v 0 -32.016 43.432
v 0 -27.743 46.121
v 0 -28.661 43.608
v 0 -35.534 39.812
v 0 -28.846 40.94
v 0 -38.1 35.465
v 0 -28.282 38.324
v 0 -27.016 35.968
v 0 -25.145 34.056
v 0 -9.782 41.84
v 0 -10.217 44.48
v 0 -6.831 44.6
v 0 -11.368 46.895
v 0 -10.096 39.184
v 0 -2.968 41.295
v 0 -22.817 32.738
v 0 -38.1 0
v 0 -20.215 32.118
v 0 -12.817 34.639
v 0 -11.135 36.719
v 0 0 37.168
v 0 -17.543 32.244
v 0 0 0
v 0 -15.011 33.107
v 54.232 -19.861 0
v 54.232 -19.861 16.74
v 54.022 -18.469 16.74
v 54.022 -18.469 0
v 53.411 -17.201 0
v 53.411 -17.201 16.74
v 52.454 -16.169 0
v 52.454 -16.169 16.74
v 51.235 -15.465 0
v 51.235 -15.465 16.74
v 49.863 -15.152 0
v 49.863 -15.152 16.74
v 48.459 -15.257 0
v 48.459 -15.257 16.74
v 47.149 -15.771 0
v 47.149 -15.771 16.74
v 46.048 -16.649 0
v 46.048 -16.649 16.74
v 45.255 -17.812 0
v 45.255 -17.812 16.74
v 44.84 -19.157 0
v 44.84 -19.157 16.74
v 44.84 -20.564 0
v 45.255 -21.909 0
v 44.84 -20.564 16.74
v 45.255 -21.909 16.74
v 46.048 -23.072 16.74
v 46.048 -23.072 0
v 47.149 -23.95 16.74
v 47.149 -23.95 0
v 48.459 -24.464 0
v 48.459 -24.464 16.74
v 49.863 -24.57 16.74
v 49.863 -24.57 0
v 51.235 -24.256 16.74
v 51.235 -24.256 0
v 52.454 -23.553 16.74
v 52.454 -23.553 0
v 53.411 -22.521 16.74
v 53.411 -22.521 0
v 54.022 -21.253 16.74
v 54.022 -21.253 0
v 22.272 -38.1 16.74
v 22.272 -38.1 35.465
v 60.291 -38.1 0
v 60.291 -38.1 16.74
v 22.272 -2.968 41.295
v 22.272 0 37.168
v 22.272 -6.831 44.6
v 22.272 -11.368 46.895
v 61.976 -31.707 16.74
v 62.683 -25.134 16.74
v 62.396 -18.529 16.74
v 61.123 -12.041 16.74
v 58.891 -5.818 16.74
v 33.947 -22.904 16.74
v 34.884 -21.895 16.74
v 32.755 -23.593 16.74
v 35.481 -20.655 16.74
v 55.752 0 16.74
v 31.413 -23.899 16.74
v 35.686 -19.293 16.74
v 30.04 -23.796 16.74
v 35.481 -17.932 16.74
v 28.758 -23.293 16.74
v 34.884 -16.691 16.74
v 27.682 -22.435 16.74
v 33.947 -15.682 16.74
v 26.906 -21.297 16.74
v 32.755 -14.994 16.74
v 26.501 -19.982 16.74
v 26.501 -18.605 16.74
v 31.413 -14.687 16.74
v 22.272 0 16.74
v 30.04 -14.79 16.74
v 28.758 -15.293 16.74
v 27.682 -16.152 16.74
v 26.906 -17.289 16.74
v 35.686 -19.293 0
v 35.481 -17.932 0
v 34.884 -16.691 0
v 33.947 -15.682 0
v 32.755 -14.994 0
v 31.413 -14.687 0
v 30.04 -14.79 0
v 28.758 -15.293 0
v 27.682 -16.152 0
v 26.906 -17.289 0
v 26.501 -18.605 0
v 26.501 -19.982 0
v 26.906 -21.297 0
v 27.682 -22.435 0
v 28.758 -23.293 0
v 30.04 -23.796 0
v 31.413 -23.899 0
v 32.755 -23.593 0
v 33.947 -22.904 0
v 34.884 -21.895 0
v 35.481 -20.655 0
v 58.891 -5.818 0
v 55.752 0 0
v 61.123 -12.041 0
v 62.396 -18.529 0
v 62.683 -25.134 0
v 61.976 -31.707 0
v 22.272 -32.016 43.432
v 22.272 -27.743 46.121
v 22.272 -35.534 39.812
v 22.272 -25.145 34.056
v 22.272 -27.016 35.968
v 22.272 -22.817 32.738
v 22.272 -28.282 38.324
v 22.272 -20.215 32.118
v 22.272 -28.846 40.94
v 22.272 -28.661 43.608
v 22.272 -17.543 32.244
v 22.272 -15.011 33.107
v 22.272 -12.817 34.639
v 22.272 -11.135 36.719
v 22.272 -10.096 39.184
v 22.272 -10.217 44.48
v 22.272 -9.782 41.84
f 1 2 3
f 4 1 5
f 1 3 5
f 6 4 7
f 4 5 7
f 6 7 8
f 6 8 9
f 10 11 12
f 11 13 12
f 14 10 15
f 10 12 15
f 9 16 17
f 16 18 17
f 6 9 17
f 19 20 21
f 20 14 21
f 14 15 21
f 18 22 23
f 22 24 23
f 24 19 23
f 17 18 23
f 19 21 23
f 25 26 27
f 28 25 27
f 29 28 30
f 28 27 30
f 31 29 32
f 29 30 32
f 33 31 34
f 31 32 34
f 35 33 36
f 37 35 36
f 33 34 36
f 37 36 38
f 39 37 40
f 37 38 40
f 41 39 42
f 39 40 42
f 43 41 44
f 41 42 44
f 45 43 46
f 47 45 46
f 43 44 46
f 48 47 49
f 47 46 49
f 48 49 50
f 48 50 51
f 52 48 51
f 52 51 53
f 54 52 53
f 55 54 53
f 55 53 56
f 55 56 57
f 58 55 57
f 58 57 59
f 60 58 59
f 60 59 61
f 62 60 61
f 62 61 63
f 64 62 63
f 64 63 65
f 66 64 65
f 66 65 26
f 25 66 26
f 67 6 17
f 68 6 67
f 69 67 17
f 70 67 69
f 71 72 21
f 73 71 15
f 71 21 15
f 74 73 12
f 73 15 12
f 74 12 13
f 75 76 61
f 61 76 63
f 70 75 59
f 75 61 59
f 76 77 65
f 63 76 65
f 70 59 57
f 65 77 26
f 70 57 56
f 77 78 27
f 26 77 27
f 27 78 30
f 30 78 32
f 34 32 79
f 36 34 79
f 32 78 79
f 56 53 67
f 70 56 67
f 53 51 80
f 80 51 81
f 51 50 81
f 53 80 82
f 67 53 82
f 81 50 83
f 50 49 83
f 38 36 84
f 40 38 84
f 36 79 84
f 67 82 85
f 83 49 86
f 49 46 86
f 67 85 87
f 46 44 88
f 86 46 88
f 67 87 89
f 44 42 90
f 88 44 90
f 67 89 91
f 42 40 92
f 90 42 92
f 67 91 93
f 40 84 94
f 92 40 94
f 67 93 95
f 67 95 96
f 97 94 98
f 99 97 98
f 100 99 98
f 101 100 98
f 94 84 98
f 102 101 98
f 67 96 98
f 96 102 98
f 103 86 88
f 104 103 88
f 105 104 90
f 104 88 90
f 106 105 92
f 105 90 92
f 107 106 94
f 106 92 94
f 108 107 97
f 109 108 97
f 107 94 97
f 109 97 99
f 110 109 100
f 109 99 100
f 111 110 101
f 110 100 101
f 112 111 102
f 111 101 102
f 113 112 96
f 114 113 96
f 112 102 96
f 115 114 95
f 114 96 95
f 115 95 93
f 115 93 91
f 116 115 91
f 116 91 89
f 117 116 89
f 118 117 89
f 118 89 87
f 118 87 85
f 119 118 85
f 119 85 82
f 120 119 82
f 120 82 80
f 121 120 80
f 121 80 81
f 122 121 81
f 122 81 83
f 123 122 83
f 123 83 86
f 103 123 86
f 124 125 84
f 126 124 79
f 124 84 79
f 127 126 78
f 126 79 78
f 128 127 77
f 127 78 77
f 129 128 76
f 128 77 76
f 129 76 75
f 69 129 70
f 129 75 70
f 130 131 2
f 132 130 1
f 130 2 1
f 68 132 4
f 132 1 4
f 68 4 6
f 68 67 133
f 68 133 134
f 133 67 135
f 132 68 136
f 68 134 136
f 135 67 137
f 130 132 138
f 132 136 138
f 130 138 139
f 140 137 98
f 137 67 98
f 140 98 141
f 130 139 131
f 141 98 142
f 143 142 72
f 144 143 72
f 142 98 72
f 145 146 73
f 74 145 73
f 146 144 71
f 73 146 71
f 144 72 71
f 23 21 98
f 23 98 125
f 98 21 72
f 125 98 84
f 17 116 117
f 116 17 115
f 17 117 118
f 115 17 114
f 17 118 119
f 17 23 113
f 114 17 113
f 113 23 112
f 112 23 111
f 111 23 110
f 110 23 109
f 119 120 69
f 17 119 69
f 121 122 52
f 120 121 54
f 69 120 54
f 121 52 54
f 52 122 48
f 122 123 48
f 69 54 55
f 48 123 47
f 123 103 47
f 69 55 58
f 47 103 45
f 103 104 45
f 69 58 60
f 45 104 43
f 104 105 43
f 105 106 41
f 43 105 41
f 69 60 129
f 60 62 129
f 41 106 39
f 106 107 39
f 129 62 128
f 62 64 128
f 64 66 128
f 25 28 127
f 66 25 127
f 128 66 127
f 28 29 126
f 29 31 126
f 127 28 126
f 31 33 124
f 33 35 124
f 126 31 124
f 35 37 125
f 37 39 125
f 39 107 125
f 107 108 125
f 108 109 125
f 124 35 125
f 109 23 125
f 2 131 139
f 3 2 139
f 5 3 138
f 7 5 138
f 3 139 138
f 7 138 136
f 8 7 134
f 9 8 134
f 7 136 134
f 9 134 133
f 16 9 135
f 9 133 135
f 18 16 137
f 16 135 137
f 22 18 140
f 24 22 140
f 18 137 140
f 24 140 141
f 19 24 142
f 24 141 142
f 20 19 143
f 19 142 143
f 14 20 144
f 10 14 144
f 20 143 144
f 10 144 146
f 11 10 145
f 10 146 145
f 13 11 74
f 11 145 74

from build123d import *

# Parameters (mm, degrees)
F1_DEPTH  = 38.1
F3_DEPTH  = 25.4
F4_R      = 4.6186777809
F4_R_2    = 4.7220992833
F5_DEPTH  = 25.4
F7_DEPTH  = 25.4
F9_DEPTH  = 25.4
F11_DEPTH = 25.4


with BuildPart() as f1:
    # F0 (on Front) → F1 (new body)
    with BuildSketch(Plane.XZ):
        Polygon((0, 49.3678711355), (0, 0), (68.8029304147, 0), (68.8029304147, 16.7396813631), (22.272285074, 16.7396813631), (22.272285074, 49.3678711355), align=None)
    extrude(amount=F1_DEPTH)

    # F2 (on face) → F3 (cut)
    with BuildSketch(Plane.XY.offset(16.7396813631)):
        with BuildLine():
            ThreePointArc((55.7516478002, 0), (66.4469620448, -18.046107265), (60.291223228, -38.1))
            Line((60.291223228, -38.1), (68.8029304147, -38.1))
            Line((68.8029304147, -38.1), (68.8029304147, 0))
            Line((68.8029304147, 0), (55.7516478002, 0))
        make_face()
    extrude(amount=-F3_DEPTH, mode=Mode.SUBTRACT)

    # F4 (on face) → F5 (cut)
    with BuildSketch(Plane.XY.offset(16.7396813631)):
        with Locations((31.0677159578, -19.2931909114)):
            Circle(F4_R)
        with Locations((49.5097339153, -19.8606383055)):
            Circle(F4_R_2)
    extrude(amount=-F5_DEPTH, mode=Mode.SUBTRACT)

    # F6 (on face) → F7 (cut)
    with BuildSketch(Plane(origin=(0, 0, 0), x_dir=(0, -1, 0), z_dir=(-1, 0, 0))):
        with BuildLine():
            ThreePointArc((0, 37.1677689254), (19.5787852864, 48.1513039346), (38.1, 35.465426743))
            Line((38.1, 35.465426743), (38.1, 49.3678711355))
            Line((38.1, 49.3678711355), (0, 49.3678711355))
            Line((0, 49.3678711355), (0, 37.1677689254))
        make_face()
    extrude(amount=-F7_DEPTH, mode=Mode.SUBTRACT)

    # F8 (on face) → F9 (cut)
    with BuildSketch(Plane.YZ.offset(22.272285074)):
        with BuildLine():
            ThreePointArc((-11.3676669021, 46.8945718353), (-19.633075345, 48.1488087071), (-27.7434336329, 46.1209587865))
            ThreePointArc((-27.7434336329, 46.1209587865), (-18.8743086198, 32.0873075282), (-11.3676669021, 46.8945718352))
        make_face()
    extrude(amount=-F9_DEPTH, mode=Mode.SUBTRACT)

    # F10 (on face) → F11 (cut)
    with BuildSketch(Plane.XY.offset(16.7396813631)):
        with BuildLine():
            ThreePointArc((55.7516478002, 0), (62.3960801541, -18.5287656348), (60.291223228, -38.1))
            ThreePointArc((60.291223228, -38.1), (66.4469620448, -18.046107265), (55.7516478002, 0))
        make_face()
    extrude(amount=-F11_DEPTH, mode=Mode.SUBTRACT)


solid = f1.part
